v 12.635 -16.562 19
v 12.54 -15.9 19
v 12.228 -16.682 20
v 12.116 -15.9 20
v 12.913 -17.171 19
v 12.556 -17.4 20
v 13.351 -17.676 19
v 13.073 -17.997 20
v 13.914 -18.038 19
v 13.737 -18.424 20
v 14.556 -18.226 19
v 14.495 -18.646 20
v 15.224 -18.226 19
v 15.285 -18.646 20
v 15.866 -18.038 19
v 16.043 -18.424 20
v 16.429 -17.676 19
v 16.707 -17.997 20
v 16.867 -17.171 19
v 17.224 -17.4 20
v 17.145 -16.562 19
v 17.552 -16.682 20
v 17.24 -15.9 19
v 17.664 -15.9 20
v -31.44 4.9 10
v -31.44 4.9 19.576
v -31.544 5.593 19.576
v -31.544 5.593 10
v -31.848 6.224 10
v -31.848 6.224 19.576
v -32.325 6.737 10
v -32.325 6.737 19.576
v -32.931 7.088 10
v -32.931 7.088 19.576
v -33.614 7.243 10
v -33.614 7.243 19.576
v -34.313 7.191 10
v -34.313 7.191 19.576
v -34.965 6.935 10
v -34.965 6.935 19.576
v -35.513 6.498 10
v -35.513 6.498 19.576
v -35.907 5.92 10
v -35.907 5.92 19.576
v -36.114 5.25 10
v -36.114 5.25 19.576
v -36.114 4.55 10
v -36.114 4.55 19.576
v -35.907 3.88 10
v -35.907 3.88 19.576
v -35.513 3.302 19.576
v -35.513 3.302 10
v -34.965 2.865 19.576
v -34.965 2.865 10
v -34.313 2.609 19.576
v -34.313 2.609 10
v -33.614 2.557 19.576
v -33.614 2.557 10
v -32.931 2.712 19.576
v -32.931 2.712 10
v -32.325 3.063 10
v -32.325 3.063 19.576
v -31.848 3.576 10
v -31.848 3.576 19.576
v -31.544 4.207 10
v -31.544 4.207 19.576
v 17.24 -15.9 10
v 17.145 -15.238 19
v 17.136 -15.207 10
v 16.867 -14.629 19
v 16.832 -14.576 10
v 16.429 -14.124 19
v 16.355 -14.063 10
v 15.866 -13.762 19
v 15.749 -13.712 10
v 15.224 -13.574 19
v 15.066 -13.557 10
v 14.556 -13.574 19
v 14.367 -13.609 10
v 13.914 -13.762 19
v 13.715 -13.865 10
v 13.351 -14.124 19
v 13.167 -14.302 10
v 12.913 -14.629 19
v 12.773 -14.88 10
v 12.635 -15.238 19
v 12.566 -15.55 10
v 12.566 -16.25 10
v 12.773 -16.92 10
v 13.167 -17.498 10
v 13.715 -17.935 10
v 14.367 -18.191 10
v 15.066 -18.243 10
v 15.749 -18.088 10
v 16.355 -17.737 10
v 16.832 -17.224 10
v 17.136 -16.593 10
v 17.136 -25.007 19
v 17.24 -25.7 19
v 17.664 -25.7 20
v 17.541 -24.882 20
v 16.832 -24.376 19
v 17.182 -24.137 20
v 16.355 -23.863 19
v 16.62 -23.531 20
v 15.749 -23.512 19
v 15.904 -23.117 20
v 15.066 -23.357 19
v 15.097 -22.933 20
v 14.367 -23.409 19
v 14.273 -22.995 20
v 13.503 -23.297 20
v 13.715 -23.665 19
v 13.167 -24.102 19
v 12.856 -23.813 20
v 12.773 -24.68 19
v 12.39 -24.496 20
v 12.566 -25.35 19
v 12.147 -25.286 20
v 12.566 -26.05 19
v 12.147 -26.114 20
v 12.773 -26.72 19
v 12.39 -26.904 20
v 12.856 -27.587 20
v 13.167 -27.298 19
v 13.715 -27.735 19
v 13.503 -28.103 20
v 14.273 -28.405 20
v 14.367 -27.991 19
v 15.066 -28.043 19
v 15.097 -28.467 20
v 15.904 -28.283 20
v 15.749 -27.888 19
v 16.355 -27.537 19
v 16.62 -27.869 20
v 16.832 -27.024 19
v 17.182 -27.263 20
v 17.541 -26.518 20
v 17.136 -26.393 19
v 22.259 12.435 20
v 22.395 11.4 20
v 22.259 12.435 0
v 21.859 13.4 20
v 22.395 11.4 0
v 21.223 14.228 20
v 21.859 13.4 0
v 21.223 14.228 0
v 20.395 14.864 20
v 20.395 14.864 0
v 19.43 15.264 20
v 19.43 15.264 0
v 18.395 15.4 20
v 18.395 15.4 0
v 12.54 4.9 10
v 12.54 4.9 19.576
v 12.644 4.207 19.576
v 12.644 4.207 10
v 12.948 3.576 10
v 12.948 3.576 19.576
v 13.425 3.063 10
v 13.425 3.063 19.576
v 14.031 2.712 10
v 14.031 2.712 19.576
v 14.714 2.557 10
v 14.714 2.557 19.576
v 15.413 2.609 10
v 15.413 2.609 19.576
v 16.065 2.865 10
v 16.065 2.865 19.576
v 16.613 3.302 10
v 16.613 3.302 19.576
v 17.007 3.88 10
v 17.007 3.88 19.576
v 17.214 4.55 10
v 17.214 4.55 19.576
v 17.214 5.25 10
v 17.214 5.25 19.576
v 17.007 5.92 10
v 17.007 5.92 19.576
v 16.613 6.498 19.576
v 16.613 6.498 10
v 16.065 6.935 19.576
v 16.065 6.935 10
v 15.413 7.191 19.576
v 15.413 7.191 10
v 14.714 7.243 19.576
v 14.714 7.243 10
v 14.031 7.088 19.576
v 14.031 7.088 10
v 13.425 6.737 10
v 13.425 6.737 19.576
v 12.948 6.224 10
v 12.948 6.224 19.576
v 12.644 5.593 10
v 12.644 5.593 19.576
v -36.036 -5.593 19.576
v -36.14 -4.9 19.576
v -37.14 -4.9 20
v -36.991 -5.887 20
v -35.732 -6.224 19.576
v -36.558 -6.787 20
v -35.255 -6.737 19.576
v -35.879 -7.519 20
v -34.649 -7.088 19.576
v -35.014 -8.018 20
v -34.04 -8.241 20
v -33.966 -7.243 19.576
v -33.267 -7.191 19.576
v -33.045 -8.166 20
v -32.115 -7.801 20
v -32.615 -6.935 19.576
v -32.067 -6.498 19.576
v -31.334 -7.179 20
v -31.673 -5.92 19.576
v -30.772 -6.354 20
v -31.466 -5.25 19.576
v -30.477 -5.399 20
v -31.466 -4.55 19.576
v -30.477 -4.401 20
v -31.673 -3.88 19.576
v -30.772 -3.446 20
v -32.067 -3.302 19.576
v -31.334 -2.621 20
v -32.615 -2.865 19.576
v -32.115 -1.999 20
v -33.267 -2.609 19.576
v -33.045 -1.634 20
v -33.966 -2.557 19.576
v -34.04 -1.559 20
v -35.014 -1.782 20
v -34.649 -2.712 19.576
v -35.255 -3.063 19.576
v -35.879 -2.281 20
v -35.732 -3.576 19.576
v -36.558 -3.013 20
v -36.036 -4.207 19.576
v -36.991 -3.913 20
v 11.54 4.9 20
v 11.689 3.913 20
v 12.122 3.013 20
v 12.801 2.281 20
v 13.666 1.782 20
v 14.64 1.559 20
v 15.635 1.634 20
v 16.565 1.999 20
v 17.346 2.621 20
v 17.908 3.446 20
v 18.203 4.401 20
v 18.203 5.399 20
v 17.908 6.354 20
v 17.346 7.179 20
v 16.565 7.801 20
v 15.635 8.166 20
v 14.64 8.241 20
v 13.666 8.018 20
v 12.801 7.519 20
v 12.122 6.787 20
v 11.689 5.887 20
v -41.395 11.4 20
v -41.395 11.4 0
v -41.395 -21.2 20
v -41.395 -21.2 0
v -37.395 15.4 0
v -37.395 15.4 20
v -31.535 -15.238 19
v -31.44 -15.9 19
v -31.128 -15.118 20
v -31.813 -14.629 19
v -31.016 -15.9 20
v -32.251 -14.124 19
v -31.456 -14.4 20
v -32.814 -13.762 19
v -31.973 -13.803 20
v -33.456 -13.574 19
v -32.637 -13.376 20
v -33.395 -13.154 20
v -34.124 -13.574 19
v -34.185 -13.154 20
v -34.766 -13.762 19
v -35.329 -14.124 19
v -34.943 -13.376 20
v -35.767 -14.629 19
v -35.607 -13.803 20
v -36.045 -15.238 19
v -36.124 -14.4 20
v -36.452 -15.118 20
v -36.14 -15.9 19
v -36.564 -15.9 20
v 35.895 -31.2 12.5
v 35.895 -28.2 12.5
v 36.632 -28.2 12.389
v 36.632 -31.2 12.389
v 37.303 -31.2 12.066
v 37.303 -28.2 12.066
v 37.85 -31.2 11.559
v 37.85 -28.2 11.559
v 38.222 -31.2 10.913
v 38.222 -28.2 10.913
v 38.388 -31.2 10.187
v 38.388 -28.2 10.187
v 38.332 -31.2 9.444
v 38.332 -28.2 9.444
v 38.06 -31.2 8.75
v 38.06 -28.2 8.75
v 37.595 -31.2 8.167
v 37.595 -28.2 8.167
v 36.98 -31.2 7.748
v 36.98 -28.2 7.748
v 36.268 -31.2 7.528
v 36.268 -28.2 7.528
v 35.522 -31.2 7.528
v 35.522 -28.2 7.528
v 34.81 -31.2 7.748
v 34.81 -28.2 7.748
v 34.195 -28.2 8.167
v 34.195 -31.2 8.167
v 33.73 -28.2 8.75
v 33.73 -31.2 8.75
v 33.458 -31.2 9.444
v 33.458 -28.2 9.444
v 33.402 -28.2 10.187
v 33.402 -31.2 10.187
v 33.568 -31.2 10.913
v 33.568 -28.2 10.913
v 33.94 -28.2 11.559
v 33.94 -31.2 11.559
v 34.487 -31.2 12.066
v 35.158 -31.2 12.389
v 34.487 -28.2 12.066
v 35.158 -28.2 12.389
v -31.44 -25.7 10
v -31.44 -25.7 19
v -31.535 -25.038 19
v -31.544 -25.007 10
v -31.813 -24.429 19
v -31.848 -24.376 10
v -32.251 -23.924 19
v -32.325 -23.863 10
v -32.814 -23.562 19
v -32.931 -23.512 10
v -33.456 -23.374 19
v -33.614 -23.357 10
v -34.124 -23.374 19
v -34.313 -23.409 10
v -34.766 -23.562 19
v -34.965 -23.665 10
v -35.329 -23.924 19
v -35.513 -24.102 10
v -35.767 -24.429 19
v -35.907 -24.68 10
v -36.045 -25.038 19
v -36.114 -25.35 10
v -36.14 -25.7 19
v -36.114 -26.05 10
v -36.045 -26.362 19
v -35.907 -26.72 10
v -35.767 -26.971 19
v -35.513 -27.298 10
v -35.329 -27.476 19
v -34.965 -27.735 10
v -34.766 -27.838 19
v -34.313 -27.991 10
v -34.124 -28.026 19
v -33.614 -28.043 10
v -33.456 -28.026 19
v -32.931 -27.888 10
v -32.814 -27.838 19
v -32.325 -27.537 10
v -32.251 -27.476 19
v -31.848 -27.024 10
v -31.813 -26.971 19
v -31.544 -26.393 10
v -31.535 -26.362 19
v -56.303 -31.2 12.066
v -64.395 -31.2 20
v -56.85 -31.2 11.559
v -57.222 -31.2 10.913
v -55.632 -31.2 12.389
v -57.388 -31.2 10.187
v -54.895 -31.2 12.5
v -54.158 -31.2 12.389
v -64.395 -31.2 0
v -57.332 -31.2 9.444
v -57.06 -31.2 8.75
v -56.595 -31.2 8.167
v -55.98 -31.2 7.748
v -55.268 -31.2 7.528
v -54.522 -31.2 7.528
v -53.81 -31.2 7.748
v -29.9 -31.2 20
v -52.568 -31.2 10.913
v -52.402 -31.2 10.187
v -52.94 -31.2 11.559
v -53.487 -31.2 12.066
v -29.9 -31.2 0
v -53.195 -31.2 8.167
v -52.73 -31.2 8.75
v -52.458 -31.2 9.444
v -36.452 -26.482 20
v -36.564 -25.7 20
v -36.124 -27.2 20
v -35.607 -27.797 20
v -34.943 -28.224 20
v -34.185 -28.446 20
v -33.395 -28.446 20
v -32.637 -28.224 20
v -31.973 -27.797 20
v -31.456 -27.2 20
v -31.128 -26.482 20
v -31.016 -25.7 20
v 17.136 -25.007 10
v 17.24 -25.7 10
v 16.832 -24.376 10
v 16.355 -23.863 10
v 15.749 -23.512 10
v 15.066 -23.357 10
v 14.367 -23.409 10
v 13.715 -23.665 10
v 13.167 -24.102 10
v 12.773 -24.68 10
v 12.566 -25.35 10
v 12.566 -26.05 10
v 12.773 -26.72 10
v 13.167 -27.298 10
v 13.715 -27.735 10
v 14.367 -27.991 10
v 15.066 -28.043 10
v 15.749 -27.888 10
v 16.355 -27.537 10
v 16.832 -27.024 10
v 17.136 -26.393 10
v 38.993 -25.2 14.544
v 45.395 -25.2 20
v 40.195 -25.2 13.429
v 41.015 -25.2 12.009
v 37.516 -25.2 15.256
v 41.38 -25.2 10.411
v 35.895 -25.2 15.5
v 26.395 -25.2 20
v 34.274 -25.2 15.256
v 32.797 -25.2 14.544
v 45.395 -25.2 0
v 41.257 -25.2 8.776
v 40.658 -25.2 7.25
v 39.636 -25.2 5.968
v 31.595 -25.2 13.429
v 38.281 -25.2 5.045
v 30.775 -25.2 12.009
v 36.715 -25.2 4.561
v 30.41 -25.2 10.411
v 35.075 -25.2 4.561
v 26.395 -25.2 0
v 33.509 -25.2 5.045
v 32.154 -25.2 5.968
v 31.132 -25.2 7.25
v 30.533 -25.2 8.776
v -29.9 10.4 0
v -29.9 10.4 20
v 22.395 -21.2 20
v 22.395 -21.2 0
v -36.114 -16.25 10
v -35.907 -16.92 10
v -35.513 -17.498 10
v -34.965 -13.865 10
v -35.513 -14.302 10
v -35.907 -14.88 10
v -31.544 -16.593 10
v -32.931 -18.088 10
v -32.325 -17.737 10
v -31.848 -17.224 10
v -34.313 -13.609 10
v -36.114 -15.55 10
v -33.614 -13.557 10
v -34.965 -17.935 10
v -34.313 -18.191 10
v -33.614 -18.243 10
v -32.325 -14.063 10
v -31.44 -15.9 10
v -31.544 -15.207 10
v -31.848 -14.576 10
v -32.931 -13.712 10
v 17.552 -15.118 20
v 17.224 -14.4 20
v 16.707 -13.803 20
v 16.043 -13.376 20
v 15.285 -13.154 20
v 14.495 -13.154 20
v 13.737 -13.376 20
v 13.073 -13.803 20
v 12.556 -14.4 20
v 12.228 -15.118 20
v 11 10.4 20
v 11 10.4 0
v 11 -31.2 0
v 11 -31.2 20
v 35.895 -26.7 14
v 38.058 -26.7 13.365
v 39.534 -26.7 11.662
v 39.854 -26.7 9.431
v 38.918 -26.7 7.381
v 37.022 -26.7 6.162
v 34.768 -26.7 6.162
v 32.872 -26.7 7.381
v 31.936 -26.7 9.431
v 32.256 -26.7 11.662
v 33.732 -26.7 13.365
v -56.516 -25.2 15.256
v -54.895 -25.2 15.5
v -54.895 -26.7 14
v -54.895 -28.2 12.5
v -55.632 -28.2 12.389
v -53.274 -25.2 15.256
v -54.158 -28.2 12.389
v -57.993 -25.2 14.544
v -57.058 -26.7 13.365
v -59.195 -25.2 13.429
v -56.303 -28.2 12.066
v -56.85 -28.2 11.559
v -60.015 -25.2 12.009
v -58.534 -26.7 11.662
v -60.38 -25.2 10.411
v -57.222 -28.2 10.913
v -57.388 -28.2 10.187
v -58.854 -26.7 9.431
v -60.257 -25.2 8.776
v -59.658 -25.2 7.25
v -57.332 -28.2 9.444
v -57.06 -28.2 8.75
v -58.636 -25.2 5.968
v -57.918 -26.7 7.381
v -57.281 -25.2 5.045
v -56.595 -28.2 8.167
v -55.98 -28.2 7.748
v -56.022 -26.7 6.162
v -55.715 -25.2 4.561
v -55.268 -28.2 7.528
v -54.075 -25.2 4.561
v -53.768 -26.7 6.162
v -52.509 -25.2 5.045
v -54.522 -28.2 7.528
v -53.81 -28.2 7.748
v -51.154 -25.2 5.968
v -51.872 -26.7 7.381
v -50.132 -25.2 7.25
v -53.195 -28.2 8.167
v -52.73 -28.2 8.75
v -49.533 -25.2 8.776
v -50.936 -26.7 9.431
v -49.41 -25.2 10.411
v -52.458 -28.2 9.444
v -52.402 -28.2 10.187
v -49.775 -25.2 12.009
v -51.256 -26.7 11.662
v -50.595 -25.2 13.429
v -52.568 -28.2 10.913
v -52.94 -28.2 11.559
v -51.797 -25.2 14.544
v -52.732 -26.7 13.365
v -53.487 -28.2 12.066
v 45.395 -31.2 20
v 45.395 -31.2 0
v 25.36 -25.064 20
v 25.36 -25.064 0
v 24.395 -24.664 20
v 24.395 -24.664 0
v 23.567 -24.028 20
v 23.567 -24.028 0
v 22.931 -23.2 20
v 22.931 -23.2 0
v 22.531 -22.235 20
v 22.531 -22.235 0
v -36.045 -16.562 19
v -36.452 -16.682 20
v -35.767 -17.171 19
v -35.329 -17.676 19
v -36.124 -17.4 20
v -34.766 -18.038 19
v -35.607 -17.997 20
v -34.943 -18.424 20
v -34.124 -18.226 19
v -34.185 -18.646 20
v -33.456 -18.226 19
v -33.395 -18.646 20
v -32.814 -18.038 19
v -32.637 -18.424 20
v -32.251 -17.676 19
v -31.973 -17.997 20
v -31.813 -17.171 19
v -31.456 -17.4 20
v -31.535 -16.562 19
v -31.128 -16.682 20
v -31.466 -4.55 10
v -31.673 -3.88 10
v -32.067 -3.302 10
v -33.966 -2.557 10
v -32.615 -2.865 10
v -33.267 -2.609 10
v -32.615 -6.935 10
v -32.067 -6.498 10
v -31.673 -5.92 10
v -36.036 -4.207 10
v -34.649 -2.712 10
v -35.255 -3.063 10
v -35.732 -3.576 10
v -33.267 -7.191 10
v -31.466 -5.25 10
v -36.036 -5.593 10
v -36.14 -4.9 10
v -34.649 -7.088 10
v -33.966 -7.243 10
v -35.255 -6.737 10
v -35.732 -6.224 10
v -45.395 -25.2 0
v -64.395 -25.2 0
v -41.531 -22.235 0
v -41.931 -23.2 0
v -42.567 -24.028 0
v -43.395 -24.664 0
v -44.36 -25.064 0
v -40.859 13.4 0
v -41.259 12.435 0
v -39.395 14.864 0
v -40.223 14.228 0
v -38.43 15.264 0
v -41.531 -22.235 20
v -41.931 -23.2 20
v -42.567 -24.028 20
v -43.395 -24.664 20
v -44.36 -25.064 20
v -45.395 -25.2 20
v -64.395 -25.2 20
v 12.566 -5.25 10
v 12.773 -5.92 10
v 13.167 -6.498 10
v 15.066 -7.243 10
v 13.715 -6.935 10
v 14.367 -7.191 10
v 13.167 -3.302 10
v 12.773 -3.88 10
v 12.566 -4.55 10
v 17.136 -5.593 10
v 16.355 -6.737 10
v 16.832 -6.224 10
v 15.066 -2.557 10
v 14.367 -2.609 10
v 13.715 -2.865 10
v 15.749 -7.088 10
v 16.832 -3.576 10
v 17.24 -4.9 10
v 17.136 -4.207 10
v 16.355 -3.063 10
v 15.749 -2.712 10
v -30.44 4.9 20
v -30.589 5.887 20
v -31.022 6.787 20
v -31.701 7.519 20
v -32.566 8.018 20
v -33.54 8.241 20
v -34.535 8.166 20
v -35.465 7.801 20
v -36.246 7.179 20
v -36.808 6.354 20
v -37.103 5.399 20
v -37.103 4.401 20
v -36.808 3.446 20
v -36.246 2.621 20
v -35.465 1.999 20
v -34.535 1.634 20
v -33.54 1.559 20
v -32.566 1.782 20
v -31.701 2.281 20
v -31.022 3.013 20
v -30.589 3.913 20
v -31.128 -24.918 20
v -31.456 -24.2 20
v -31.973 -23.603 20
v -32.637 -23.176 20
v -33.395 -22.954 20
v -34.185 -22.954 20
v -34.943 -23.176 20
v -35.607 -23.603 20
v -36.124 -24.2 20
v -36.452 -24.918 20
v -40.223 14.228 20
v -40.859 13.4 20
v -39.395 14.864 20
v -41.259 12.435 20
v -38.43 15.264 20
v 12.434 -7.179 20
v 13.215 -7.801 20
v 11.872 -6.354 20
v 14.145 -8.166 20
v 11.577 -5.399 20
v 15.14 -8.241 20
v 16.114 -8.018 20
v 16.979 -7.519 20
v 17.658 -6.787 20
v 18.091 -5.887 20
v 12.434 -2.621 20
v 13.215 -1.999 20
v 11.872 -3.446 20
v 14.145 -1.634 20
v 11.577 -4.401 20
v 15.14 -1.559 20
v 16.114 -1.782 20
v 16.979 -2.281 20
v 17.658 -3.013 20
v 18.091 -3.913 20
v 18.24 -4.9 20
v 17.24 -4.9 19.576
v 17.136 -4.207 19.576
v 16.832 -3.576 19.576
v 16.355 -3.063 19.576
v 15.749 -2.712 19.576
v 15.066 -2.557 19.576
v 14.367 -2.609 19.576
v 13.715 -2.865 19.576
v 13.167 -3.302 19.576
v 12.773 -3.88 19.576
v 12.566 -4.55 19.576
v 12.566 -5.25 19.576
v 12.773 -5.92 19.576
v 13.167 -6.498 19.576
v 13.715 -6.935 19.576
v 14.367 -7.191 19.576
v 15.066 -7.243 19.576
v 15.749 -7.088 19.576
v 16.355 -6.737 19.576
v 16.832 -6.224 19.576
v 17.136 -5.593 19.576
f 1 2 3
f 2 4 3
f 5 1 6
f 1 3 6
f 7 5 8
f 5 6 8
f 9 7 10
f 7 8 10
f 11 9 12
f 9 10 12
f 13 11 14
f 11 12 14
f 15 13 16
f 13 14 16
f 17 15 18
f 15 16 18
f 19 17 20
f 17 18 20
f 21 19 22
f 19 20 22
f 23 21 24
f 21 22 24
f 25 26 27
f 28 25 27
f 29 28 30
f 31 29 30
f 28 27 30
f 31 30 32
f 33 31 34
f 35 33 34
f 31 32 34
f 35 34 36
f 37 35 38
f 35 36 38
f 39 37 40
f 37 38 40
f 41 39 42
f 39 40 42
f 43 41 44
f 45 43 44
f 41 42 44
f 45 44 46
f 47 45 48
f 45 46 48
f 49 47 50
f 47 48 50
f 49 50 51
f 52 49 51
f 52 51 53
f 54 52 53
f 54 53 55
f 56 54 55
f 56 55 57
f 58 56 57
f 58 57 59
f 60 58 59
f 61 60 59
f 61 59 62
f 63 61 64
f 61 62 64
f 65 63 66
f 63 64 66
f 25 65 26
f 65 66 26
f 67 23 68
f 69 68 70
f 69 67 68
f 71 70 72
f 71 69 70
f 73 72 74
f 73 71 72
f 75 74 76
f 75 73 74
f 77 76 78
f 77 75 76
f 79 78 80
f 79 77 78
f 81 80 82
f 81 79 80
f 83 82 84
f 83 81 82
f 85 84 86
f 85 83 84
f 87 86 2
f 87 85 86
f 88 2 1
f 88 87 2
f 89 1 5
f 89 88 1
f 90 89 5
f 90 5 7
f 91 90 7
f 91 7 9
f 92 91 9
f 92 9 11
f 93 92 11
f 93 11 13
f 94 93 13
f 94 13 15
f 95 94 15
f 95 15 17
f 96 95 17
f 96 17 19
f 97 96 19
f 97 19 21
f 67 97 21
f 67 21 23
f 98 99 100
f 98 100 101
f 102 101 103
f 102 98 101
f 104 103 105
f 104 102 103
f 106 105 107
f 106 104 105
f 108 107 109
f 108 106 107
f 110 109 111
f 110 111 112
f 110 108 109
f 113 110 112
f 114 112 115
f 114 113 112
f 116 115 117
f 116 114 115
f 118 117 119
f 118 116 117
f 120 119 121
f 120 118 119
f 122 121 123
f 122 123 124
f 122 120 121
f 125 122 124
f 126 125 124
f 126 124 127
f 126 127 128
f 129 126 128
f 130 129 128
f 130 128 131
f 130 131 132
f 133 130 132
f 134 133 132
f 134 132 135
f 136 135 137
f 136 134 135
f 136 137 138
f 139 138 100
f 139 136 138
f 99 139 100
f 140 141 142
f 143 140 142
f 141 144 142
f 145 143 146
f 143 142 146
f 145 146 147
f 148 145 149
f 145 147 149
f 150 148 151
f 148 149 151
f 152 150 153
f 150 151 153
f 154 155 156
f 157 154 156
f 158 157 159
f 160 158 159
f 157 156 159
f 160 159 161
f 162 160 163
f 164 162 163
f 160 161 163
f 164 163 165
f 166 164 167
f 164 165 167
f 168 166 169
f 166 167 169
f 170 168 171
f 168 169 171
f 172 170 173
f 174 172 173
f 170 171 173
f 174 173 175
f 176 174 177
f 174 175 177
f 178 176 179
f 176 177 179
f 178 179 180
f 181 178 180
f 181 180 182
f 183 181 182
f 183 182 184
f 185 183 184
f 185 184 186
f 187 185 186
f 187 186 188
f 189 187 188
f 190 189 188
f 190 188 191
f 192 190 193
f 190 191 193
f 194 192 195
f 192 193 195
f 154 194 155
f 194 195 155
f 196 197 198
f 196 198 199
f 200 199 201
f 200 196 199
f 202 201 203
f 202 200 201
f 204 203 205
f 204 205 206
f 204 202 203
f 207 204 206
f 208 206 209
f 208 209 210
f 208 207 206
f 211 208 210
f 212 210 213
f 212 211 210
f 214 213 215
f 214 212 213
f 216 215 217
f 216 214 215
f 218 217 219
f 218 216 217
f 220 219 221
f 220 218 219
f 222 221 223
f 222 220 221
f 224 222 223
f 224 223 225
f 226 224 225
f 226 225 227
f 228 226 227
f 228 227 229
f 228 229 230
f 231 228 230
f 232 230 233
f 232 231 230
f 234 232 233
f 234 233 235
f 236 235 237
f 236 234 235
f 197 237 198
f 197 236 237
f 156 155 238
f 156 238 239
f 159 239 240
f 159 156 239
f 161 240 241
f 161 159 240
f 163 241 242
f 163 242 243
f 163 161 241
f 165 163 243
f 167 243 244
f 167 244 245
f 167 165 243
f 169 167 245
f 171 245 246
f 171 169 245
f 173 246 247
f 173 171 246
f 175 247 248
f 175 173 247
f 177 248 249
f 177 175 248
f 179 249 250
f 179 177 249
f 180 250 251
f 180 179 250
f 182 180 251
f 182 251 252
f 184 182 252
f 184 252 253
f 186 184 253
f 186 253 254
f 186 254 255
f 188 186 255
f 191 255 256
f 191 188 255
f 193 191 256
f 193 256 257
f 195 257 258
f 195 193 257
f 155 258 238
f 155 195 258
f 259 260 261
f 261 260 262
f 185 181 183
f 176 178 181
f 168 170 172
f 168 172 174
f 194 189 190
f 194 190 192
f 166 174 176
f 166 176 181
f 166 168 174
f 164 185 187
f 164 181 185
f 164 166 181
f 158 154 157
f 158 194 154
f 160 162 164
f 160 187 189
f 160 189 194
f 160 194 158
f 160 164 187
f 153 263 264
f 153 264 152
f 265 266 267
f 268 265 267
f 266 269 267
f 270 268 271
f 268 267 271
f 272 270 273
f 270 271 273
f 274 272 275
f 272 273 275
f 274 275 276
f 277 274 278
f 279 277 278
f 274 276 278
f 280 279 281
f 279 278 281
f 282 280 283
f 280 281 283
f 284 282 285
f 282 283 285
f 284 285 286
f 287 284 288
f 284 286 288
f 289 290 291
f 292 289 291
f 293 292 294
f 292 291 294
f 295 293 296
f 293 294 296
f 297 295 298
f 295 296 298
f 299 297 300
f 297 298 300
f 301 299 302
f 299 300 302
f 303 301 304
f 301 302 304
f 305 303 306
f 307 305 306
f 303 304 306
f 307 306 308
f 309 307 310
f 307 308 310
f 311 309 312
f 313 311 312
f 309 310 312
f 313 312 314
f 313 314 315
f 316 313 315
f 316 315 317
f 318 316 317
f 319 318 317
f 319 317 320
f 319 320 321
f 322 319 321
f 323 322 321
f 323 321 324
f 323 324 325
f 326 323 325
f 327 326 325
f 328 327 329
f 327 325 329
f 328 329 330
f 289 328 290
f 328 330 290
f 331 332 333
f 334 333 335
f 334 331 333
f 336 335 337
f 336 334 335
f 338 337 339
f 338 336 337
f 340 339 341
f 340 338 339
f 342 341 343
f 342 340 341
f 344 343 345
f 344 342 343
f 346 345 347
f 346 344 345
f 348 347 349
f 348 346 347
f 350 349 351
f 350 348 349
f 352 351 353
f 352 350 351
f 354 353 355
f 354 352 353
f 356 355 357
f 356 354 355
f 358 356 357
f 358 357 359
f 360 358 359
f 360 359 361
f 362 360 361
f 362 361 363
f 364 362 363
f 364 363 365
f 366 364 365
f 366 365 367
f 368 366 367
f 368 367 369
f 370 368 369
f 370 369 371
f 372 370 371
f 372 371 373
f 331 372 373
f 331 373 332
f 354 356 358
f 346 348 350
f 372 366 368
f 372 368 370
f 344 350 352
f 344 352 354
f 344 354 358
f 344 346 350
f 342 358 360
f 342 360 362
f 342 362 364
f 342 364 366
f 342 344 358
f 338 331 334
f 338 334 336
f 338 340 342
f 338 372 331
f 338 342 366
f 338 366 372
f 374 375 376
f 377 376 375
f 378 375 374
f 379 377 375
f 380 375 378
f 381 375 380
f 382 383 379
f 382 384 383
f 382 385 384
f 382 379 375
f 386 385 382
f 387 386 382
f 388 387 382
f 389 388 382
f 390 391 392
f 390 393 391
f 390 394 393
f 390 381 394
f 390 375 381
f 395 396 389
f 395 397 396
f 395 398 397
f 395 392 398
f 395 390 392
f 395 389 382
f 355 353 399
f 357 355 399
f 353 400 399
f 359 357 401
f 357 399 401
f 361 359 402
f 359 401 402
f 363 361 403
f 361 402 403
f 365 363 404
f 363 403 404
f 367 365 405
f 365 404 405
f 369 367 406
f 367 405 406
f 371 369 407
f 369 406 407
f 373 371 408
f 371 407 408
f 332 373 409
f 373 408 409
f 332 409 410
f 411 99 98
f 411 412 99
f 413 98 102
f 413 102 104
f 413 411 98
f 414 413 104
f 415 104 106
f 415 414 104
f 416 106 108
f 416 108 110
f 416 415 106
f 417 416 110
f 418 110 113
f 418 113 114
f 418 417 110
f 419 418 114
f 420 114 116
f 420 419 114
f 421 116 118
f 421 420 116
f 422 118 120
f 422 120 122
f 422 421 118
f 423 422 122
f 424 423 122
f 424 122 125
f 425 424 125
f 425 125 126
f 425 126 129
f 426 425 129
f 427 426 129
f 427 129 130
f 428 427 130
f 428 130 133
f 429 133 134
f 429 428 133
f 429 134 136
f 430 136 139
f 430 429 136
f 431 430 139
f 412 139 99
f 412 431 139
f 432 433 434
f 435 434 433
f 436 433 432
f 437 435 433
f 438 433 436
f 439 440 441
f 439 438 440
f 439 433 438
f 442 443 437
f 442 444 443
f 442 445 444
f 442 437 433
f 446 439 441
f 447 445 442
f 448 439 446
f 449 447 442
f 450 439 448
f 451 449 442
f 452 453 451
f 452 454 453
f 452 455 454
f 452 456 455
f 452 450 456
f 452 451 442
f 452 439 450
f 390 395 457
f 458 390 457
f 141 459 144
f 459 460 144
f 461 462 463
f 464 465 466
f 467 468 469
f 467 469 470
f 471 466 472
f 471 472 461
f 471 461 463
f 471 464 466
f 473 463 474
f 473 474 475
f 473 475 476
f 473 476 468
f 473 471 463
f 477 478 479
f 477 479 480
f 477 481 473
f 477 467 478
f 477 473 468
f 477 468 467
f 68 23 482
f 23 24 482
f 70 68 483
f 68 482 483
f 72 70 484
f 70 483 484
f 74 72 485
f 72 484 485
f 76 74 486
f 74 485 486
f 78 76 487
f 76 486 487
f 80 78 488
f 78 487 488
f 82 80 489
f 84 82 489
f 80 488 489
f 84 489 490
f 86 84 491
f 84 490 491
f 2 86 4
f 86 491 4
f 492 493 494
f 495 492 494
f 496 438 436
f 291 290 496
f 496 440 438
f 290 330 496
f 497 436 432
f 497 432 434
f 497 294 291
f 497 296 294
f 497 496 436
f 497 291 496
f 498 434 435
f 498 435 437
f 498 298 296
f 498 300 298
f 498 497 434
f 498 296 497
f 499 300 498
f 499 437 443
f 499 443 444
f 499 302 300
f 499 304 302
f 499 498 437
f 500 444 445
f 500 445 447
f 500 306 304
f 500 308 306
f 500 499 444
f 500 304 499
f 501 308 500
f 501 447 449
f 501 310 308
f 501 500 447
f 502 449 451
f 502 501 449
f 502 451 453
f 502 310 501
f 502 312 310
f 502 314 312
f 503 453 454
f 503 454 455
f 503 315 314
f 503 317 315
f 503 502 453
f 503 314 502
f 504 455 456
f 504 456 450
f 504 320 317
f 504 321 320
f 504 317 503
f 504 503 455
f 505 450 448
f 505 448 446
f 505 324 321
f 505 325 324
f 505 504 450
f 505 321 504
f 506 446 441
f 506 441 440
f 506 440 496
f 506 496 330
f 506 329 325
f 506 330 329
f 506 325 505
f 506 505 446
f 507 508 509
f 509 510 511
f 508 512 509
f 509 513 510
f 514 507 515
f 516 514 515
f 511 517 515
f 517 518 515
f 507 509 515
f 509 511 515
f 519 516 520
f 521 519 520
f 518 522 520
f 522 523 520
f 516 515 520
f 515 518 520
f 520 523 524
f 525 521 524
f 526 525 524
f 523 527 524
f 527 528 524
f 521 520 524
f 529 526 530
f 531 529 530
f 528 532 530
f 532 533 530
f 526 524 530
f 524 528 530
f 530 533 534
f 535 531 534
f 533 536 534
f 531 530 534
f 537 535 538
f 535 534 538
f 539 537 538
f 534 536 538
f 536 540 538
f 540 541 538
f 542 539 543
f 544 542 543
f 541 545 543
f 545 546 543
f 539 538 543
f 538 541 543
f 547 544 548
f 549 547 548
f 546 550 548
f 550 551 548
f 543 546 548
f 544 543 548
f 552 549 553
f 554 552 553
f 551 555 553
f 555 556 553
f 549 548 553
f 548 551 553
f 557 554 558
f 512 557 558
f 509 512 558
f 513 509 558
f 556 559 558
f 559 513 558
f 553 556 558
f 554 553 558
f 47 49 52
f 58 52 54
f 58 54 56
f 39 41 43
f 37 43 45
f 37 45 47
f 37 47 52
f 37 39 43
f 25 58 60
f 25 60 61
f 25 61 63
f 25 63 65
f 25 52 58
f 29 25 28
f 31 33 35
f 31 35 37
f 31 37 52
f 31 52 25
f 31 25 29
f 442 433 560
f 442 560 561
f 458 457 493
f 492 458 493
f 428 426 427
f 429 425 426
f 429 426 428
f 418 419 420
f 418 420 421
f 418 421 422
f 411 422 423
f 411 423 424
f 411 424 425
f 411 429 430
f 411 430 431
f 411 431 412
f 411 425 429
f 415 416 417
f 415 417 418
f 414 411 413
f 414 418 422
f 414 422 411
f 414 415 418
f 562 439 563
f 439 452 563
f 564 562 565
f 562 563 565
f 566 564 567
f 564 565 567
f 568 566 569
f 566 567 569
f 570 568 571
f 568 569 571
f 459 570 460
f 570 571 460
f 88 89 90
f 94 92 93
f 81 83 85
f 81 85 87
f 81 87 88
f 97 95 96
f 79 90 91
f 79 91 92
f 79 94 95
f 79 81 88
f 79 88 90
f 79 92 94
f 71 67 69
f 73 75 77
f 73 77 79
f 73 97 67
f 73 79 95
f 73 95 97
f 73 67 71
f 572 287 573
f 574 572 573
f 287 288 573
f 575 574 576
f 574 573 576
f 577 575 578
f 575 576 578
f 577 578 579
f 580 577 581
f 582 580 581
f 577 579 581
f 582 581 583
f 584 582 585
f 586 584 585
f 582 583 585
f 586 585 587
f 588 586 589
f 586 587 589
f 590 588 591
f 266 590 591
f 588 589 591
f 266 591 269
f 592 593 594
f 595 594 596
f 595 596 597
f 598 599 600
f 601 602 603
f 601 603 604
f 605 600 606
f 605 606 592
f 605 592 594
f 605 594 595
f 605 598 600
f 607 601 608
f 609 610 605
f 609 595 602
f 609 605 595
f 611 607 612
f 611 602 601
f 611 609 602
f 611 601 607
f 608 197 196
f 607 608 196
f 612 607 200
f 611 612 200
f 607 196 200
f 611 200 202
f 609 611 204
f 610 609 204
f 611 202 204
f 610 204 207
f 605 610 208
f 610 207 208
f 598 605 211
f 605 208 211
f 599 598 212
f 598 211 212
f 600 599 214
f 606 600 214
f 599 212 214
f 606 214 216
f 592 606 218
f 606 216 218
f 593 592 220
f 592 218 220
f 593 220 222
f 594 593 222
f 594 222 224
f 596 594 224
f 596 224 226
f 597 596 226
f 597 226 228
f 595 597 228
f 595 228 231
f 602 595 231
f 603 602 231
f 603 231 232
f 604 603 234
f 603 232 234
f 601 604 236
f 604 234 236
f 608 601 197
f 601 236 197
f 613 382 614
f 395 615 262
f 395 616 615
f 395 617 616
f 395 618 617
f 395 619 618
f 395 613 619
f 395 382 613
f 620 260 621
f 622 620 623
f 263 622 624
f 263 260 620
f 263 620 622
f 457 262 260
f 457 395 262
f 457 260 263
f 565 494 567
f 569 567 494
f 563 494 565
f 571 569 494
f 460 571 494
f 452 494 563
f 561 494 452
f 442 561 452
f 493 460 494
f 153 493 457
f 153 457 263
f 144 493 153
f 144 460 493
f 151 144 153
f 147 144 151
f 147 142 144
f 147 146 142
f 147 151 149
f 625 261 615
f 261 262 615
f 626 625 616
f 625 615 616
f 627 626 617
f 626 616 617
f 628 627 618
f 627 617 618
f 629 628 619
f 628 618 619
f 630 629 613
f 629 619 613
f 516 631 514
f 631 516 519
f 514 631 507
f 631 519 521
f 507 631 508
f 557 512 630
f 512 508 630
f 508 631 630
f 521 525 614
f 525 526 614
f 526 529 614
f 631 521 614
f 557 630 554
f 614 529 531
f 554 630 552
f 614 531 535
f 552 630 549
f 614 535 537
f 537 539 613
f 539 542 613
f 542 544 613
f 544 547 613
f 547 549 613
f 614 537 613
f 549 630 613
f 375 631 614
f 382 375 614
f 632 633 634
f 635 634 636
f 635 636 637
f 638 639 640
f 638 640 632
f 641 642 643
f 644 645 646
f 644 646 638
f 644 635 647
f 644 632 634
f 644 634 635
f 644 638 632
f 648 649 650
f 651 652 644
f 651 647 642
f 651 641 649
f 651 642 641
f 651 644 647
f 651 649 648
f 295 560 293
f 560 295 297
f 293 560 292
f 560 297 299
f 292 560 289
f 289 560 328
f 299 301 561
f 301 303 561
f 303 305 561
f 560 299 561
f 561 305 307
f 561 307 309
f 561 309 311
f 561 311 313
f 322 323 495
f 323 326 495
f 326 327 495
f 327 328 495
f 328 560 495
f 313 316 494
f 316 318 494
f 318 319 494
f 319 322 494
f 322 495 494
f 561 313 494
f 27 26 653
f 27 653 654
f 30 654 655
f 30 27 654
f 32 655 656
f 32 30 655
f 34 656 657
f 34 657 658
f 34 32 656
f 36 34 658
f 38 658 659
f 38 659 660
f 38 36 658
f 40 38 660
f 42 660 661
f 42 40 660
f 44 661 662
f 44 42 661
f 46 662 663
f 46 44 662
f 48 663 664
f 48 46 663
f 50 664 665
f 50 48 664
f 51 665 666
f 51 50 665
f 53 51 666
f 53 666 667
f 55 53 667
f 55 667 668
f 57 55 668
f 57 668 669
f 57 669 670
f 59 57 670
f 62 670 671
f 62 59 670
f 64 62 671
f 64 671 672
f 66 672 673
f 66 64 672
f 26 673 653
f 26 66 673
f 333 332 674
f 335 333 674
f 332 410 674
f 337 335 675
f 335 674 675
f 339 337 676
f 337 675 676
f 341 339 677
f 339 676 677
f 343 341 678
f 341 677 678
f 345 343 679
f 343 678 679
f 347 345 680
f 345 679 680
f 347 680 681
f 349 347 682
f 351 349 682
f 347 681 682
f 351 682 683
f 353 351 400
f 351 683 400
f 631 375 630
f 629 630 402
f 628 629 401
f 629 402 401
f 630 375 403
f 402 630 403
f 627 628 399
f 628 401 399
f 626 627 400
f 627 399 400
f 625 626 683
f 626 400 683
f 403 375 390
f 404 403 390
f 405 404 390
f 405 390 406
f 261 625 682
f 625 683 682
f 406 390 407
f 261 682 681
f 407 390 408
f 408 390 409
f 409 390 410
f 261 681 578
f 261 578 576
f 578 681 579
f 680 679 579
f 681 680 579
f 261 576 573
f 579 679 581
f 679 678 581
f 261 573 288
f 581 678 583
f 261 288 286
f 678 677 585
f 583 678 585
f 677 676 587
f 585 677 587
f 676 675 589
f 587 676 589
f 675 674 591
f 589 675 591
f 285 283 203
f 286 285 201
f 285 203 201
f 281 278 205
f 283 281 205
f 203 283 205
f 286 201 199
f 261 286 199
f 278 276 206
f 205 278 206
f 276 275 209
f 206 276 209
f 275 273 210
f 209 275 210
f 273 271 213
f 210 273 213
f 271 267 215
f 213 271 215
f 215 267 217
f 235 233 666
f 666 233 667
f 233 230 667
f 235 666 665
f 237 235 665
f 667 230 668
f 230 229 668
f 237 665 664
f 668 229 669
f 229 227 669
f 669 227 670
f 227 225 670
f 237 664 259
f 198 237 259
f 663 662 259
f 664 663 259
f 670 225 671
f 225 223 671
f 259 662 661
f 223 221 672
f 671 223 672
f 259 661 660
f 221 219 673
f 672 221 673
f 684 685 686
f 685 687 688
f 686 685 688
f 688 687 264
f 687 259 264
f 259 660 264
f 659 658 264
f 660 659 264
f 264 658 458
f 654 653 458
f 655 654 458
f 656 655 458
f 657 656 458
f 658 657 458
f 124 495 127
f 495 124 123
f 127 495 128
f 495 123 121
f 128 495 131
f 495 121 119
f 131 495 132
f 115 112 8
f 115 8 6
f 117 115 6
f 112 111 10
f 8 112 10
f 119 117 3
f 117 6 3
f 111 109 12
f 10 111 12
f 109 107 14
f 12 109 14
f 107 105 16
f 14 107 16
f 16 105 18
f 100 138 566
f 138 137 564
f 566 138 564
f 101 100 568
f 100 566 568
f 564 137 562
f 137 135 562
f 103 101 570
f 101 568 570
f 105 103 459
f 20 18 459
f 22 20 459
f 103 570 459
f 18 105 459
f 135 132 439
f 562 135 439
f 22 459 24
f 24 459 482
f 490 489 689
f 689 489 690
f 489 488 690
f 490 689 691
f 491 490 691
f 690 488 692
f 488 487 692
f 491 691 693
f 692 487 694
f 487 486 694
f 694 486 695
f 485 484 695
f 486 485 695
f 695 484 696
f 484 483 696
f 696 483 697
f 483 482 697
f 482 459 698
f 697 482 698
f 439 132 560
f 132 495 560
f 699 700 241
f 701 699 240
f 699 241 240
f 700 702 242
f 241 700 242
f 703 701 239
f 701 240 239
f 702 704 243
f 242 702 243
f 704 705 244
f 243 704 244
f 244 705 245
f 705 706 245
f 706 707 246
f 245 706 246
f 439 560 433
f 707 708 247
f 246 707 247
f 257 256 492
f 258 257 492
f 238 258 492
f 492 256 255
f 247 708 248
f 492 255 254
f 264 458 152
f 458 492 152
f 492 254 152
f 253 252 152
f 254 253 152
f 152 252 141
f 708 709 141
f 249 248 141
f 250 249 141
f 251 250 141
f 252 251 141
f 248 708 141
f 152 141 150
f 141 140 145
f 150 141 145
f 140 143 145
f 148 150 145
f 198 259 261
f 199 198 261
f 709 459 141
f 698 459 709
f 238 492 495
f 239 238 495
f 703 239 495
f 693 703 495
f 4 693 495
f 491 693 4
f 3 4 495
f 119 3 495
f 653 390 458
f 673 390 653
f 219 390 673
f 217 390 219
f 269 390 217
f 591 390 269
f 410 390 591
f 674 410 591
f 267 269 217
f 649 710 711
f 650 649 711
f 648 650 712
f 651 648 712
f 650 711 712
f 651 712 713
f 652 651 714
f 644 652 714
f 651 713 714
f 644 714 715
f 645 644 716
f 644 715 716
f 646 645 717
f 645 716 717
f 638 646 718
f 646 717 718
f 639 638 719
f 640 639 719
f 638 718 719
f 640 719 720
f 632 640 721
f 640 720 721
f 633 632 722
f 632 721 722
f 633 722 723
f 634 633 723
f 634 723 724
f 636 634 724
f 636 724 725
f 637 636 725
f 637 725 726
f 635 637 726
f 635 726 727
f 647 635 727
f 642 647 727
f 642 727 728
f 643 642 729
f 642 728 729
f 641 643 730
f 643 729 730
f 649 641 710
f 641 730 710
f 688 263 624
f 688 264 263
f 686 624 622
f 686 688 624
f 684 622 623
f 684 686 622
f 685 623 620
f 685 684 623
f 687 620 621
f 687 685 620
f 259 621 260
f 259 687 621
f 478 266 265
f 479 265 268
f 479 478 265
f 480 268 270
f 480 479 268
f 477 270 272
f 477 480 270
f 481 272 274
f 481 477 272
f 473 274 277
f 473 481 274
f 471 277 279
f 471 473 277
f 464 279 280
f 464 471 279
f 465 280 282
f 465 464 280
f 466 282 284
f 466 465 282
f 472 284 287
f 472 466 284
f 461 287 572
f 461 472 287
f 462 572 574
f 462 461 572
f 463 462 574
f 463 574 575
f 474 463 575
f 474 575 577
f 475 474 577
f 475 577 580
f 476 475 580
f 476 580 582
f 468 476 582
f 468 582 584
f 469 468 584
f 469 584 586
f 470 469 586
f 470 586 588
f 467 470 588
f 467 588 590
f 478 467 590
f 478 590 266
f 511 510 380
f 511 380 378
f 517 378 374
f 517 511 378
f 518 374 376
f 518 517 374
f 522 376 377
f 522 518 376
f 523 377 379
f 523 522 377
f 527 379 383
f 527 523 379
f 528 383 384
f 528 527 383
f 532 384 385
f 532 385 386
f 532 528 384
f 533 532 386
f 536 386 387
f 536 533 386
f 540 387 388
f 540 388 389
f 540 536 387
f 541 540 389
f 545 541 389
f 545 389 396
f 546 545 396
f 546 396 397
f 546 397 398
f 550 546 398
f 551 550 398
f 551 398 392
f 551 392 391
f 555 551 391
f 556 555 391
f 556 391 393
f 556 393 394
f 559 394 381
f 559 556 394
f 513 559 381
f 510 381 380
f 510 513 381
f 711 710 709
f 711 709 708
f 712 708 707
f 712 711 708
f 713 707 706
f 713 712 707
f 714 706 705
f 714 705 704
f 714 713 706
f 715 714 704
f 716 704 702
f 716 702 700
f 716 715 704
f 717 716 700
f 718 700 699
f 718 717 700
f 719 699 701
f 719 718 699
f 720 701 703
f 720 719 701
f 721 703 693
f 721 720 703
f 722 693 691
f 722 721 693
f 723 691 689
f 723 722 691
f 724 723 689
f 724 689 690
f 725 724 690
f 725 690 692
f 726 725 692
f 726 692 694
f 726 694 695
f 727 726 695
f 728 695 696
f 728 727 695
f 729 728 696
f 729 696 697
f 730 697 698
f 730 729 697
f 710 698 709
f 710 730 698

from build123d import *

# Parameters (mm, degrees)
SKETCH1_W             = 18.495
SKETCH1_H             = 20.8
SKETCH1_W_2           = 10
SKETCH1_W_3           = 37.395
BOSS_EXTRUDE1_DEPTH   = 20
SKETCH6_W             = 106.79
SKETCH6_H             = 20
BOSS_EXTRUDE4_DEPTH   = 5
SKETCH9_R             = 2.35
CUT_EXTRUDE1_DEPTH    = 10
SKETCH10_W            = 20
SKETCH10_H            = 25.8
CUT_EXTRUDE2_DEPTH    = 17
SKETCH11_W            = 20
SKETCH11_H            = 25.8
CUT_EXTRUDE3_DEPTH    = 26
CHAMFER1_SIZE         = 1
CHAMFER1_SIZE2        = 0.424474816
MIRROR1_2_OUTLINE_R   = 2.35
MIRROR1_2_OUTLINE_R_2 = 2.774474816
MIRROR1_2_DEPTH       = 20
MIRROR1_3_OUTLINE_R   = 2.35
MIRROR1_3_OUTLINE_R_2 = 2.774474816
MIRROR1_3_DEPTH       = 10
SKETCH12_W            = 63.79
SKETCH12_H            = 20
CUT_EXTRUDE4_DEPTH    = 5
SKETCH13_W            = 20
SKETCH13_H            = 6
BOSS_EXTRUDE5_DEPTH   = 23
FILLET2_R             = 4
SKETCH14_R            = 2.5
CUT_EXTRUDE5_DEPTH    = 6
CHAMFER2_SIZE         = 3


with BuildPart() as part:
    # Sketch1 → Boss-Extrude1 (new body)
    with BuildSketch(Plane.XY):
        with Locations((-39.1475, 0)):
            Rectangle(SKETCH1_W, SKETCH1_H)
        with Locations((-53.395, 0)):
            Rectangle(SKETCH1_W_2, SKETCH1_H)
        with Locations((29.6975, 0)):
            Rectangle(SKETCH1_W_3, SKETCH1_H)
    extrude(amount=BOSS_EXTRUDE1_DEPTH)

    # Sketch6 → Boss-Extrude4 (add)
    with BuildSketch(Plane(origin=(0, 10.4, 0), x_dir=(1, 0, 0), z_dir=(0, 1, 0))):
        with Locations((-5, -10)):
            Rectangle(SKETCH6_W, SKETCH6_H)
    extrude(amount=BOSS_EXTRUDE4_DEPTH)

    # Sketch9 → Cut-Extrude1 (cut)
    with BuildSketch(Plane.XY.offset(20)):
        with Locations((14.89, -4.9)):
            Circle(SKETCH9_R)
        with Locations(Location((14.89, 4.9, 0), (0, 0, 180))):
            Circle(SKETCH9_R)
        with Locations(Location((-33.79, -4.9, 0), (0, 0, 180))):
            Circle(SKETCH9_R)
        with Locations((-33.79, 4.9)):
            Circle(SKETCH9_R)
    extrude(amount=-CUT_EXTRUDE1_DEPTH, mode=Mode.SUBTRACT)

    # Sketch10 → Cut-Extrude2 (cut)
    with BuildSketch(Plane.ZY.offset(58.395)):
        with Locations((10, 2.5)):
            Rectangle(SKETCH10_W, SKETCH10_H)
    extrude(amount=-CUT_EXTRUDE2_DEPTH, mode=Mode.SUBTRACT)

    # Sketch11 → Cut-Extrude3 (cut)
    with BuildSketch(Plane(origin=(48.395, 0, 0), x_dir=(0, 0, -1), z_dir=(1, 0, 0))):
        with Locations((-10, 2.5)):
            Rectangle(SKETCH11_W, SKETCH11_H)
    extrude(amount=-CUT_EXTRUDE3_DEPTH, mode=Mode.SUBTRACT)

    # Chamfer1
    chamfer1_edges = [part.edges().sort_by_distance(p)[0] for p in [
        (17.24, 4.9, 20),
        (-31.44, -4.9, 20),
        (-36.14, 4.9, 20),
        (12.54, -4.9, 20),
    ]]
    chamfer1_side = [part.faces().sort_by_distance(p)[0] for p in [
        (-35.6475, -9.711900872, 20),
    ]]
    chamfer(chamfer1_edges, length=CHAMFER1_SIZE, length2=CHAMFER1_SIZE2, reference=chamfer1_side[0])



with BuildPart() as body_2:
    # Mirror1: read off the stored shape, not the designer's step
    # Mirror1 outline → Mirror1 (revolve)
    with BuildSketch(Plane(origin=(14.89, -25.7, 0), x_dir=(1, 0, 0), z_dir=(0, -1, 0))):
        Polygon((2.35, 19), (2.35, 10), (2.774474816, 10), (2.774474816, 20), align=None)
    revolve(axis=Axis((14.89, -25.7, 0), (0, 0, 1)))


with BuildPart() as part_1:
    add(part.part)

    add(body_2.part)  # Mirror1 2 merges body 2
    # Mirror1 2 outline → Mirror1 2 (add)
    with BuildSketch(Plane.XY):
        Polygon((-41.395, -10.4), (-41.395, -36.2), (22.395, -36.2), (22.395, -10.4), (11, -10.4), (11, -31.2), (-29.9, -31.2), (-29.9, -10.4), align=None)
        with Locations((-33.79, -25.7)):
            Circle(MIRROR1_2_OUTLINE_R, mode=Mode.SUBTRACT)
        with Locations((14.89, -25.7)):
            Circle(MIRROR1_2_OUTLINE_R_2, mode=Mode.SUBTRACT)
        with Locations((-33.79, -15.9)):
            Circle(MIRROR1_2_OUTLINE_R, mode=Mode.SUBTRACT)
        with Locations((14.89, -15.9)):
            Circle(MIRROR1_2_OUTLINE_R, mode=Mode.SUBTRACT)
    extrude(amount=MIRROR1_2_DEPTH)

    # Mirror1 3 outline → Mirror1 3 (add)
    with BuildSketch(Plane.XY):
        with Locations((14.89, -15.9)):
            Circle(MIRROR1_3_OUTLINE_R)
        with Locations((-33.79, -25.7)):
            Circle(MIRROR1_3_OUTLINE_R)
        with Locations((-33.79, -15.9)):
            Circle(MIRROR1_3_OUTLINE_R)
        with Locations((14.89, -25.7)):
            Circle(MIRROR1_3_OUTLINE_R_2)
    extrude(amount=MIRROR1_3_DEPTH)

    # Mirror1 4: loft between two sections, ruled curve by curve
    mirror1_4_from = [
        Edge.make_three_point_arc((17.24, -15.9, 19), (14.89, -13.55, 19), (12.54, -15.9, 19)),
        Edge.make_three_point_arc((12.54, -15.9, 19), (14.89, -18.25, 19), (17.24, -15.9, 19)),
    ]
    mirror1_4_to = [
        Edge.make_three_point_arc((17.664474816, -15.9, 20), (14.89, -13.125525184, 20), (12.115525184, -15.9, 20)),
        Edge.make_three_point_arc((12.115525184, -15.9, 20), (14.89, -18.674474816, 20), (17.664474816, -15.9, 20)),
    ]
    mirror1_4 = Solid(Shell([*[Face.make_surface_from_curves(mirror1_4_from[k], mirror1_4_to[k]) for k in range(2)], Face(Wire(mirror1_4_from)), Face(Wire(mirror1_4_to))]))
    add(mirror1_4, mode=Mode.SUBTRACT)

    # Mirror1 5: loft between two sections, ruled curve by curve
    mirror1_5_from = [
        Edge.make_three_point_arc((-31.44, -25.7, 19), (-33.79, -23.35, 19), (-36.14, -25.7, 19)),
        Edge.make_three_point_arc((-36.14, -25.7, 19), (-33.79, -28.05, 19), (-31.44, -25.7, 19)),
    ]
    mirror1_5_to = [
        Edge.make_three_point_arc((-31.015525184, -25.7, 20), (-33.79, -22.925525184, 20), (-36.564474816, -25.7, 20)),
        Edge.make_three_point_arc((-36.564474816, -25.7, 20), (-33.79, -28.474474816, 20), (-31.015525184, -25.7, 20)),
    ]
    mirror1_5 = Solid(Shell([*[Face.make_surface_from_curves(mirror1_5_from[k], mirror1_5_to[k]) for k in range(2)], Face(Wire(mirror1_5_from)), Face(Wire(mirror1_5_to))]))
    add(mirror1_5, mode=Mode.SUBTRACT)

    # Mirror1 6: loft between two sections, ruled curve by curve
    mirror1_6_from = [
        Edge.make_three_point_arc((-31.44, -15.9, 19), (-33.79, -13.55, 19), (-36.14, -15.9, 19)),
        Edge.make_three_point_arc((-36.14, -15.9, 19), (-33.79, -18.25, 19), (-31.44, -15.9, 19)),
    ]
    mirror1_6_to = [
        Edge.make_three_point_arc((-31.015525184, -15.9, 20), (-33.79, -13.125525184, 20), (-36.564474816, -15.9, 20)),
        Edge.make_three_point_arc((-36.564474816, -15.9, 20), (-33.79, -18.674474816, 20), (-31.015525184, -15.9, 20)),
    ]
    mirror1_6 = Solid(Shell([*[Face.make_surface_from_curves(mirror1_6_from[k], mirror1_6_to[k]) for k in range(2)], Face(Wire(mirror1_6_from)), Face(Wire(mirror1_6_to))]))
    add(mirror1_6, mode=Mode.SUBTRACT)

    # Sketch12 → Cut-Extrude4 (cut)
    with BuildSketch(Plane(origin=(0, -36.2, 0), x_dir=(-1, 0, 0), z_dir=(0, -1, 0))):
        with Locations((9.5, -10)):
            Rectangle(SKETCH12_W, SKETCH12_H)
    extrude(amount=-CUT_EXTRUDE4_DEPTH, mode=Mode.SUBTRACT)

    # Sketch13 → Boss-Extrude5 (add)
    with BuildSketch(Plane(origin=(22.395, 0, 0), x_dir=(0, 0, -1), z_dir=(1, 0, 0))):
        with Locations((-10, -28.2)):
            Rectangle(SKETCH13_W, SKETCH13_H)
    boss_extrude5 = extrude(amount=BOSS_EXTRUDE5_DEPTH)

    # Mirror2: Boss-Extrude5 across plane
    add(boss_extrude5.mirror(Plane(origin=(-9.5, 0, 0), x_dir=(0, 0, 1), z_dir=(1, 0, 0))))

    # Fillet2
    fillet2_edges = [part_1.edges().sort_by_distance(p)[0] for p in [
        (22.395, -25.2, 10),
        (-41.395, -25.2, 10),
        (-41.395, 15.4, 10),
        (22.395, 15.4, 10),
    ]]
    fillet(fillet2_edges, radius=FILLET2_R)

    # Sketch14 → Cut-Extrude5 (cut)
    with BuildSketch(Plane(origin=(0, -25.2, 0), x_dir=(1, 0, 0), z_dir=(0, 1, 0))):
        with Locations(Location((35.895, -10, 0), (0, 0, 270))):
            Circle(SKETCH14_R)
    cut_extrude5 = extrude(amount=-CUT_EXTRUDE5_DEPTH, mode=Mode.SUBTRACT)

    # Mirror5: Cut-Extrude5 across plane
    add(cut_extrude5.mirror(Plane(origin=(-9.5, 0, 0), x_dir=(0, 0, 1), z_dir=(1, 0, 0))), mode=Mode.SUBTRACT)

    # Chamfer2
    chamfer2_edges = [part_1.edges().sort_by_distance(p)[0] for p in [
        (35.895, -25.2, 7.5),
        (-54.895, -25.2, 7.5),
    ]]
    chamfer(chamfer2_edges, length=CHAMFER2_SIZE)


solid = part_1.part
